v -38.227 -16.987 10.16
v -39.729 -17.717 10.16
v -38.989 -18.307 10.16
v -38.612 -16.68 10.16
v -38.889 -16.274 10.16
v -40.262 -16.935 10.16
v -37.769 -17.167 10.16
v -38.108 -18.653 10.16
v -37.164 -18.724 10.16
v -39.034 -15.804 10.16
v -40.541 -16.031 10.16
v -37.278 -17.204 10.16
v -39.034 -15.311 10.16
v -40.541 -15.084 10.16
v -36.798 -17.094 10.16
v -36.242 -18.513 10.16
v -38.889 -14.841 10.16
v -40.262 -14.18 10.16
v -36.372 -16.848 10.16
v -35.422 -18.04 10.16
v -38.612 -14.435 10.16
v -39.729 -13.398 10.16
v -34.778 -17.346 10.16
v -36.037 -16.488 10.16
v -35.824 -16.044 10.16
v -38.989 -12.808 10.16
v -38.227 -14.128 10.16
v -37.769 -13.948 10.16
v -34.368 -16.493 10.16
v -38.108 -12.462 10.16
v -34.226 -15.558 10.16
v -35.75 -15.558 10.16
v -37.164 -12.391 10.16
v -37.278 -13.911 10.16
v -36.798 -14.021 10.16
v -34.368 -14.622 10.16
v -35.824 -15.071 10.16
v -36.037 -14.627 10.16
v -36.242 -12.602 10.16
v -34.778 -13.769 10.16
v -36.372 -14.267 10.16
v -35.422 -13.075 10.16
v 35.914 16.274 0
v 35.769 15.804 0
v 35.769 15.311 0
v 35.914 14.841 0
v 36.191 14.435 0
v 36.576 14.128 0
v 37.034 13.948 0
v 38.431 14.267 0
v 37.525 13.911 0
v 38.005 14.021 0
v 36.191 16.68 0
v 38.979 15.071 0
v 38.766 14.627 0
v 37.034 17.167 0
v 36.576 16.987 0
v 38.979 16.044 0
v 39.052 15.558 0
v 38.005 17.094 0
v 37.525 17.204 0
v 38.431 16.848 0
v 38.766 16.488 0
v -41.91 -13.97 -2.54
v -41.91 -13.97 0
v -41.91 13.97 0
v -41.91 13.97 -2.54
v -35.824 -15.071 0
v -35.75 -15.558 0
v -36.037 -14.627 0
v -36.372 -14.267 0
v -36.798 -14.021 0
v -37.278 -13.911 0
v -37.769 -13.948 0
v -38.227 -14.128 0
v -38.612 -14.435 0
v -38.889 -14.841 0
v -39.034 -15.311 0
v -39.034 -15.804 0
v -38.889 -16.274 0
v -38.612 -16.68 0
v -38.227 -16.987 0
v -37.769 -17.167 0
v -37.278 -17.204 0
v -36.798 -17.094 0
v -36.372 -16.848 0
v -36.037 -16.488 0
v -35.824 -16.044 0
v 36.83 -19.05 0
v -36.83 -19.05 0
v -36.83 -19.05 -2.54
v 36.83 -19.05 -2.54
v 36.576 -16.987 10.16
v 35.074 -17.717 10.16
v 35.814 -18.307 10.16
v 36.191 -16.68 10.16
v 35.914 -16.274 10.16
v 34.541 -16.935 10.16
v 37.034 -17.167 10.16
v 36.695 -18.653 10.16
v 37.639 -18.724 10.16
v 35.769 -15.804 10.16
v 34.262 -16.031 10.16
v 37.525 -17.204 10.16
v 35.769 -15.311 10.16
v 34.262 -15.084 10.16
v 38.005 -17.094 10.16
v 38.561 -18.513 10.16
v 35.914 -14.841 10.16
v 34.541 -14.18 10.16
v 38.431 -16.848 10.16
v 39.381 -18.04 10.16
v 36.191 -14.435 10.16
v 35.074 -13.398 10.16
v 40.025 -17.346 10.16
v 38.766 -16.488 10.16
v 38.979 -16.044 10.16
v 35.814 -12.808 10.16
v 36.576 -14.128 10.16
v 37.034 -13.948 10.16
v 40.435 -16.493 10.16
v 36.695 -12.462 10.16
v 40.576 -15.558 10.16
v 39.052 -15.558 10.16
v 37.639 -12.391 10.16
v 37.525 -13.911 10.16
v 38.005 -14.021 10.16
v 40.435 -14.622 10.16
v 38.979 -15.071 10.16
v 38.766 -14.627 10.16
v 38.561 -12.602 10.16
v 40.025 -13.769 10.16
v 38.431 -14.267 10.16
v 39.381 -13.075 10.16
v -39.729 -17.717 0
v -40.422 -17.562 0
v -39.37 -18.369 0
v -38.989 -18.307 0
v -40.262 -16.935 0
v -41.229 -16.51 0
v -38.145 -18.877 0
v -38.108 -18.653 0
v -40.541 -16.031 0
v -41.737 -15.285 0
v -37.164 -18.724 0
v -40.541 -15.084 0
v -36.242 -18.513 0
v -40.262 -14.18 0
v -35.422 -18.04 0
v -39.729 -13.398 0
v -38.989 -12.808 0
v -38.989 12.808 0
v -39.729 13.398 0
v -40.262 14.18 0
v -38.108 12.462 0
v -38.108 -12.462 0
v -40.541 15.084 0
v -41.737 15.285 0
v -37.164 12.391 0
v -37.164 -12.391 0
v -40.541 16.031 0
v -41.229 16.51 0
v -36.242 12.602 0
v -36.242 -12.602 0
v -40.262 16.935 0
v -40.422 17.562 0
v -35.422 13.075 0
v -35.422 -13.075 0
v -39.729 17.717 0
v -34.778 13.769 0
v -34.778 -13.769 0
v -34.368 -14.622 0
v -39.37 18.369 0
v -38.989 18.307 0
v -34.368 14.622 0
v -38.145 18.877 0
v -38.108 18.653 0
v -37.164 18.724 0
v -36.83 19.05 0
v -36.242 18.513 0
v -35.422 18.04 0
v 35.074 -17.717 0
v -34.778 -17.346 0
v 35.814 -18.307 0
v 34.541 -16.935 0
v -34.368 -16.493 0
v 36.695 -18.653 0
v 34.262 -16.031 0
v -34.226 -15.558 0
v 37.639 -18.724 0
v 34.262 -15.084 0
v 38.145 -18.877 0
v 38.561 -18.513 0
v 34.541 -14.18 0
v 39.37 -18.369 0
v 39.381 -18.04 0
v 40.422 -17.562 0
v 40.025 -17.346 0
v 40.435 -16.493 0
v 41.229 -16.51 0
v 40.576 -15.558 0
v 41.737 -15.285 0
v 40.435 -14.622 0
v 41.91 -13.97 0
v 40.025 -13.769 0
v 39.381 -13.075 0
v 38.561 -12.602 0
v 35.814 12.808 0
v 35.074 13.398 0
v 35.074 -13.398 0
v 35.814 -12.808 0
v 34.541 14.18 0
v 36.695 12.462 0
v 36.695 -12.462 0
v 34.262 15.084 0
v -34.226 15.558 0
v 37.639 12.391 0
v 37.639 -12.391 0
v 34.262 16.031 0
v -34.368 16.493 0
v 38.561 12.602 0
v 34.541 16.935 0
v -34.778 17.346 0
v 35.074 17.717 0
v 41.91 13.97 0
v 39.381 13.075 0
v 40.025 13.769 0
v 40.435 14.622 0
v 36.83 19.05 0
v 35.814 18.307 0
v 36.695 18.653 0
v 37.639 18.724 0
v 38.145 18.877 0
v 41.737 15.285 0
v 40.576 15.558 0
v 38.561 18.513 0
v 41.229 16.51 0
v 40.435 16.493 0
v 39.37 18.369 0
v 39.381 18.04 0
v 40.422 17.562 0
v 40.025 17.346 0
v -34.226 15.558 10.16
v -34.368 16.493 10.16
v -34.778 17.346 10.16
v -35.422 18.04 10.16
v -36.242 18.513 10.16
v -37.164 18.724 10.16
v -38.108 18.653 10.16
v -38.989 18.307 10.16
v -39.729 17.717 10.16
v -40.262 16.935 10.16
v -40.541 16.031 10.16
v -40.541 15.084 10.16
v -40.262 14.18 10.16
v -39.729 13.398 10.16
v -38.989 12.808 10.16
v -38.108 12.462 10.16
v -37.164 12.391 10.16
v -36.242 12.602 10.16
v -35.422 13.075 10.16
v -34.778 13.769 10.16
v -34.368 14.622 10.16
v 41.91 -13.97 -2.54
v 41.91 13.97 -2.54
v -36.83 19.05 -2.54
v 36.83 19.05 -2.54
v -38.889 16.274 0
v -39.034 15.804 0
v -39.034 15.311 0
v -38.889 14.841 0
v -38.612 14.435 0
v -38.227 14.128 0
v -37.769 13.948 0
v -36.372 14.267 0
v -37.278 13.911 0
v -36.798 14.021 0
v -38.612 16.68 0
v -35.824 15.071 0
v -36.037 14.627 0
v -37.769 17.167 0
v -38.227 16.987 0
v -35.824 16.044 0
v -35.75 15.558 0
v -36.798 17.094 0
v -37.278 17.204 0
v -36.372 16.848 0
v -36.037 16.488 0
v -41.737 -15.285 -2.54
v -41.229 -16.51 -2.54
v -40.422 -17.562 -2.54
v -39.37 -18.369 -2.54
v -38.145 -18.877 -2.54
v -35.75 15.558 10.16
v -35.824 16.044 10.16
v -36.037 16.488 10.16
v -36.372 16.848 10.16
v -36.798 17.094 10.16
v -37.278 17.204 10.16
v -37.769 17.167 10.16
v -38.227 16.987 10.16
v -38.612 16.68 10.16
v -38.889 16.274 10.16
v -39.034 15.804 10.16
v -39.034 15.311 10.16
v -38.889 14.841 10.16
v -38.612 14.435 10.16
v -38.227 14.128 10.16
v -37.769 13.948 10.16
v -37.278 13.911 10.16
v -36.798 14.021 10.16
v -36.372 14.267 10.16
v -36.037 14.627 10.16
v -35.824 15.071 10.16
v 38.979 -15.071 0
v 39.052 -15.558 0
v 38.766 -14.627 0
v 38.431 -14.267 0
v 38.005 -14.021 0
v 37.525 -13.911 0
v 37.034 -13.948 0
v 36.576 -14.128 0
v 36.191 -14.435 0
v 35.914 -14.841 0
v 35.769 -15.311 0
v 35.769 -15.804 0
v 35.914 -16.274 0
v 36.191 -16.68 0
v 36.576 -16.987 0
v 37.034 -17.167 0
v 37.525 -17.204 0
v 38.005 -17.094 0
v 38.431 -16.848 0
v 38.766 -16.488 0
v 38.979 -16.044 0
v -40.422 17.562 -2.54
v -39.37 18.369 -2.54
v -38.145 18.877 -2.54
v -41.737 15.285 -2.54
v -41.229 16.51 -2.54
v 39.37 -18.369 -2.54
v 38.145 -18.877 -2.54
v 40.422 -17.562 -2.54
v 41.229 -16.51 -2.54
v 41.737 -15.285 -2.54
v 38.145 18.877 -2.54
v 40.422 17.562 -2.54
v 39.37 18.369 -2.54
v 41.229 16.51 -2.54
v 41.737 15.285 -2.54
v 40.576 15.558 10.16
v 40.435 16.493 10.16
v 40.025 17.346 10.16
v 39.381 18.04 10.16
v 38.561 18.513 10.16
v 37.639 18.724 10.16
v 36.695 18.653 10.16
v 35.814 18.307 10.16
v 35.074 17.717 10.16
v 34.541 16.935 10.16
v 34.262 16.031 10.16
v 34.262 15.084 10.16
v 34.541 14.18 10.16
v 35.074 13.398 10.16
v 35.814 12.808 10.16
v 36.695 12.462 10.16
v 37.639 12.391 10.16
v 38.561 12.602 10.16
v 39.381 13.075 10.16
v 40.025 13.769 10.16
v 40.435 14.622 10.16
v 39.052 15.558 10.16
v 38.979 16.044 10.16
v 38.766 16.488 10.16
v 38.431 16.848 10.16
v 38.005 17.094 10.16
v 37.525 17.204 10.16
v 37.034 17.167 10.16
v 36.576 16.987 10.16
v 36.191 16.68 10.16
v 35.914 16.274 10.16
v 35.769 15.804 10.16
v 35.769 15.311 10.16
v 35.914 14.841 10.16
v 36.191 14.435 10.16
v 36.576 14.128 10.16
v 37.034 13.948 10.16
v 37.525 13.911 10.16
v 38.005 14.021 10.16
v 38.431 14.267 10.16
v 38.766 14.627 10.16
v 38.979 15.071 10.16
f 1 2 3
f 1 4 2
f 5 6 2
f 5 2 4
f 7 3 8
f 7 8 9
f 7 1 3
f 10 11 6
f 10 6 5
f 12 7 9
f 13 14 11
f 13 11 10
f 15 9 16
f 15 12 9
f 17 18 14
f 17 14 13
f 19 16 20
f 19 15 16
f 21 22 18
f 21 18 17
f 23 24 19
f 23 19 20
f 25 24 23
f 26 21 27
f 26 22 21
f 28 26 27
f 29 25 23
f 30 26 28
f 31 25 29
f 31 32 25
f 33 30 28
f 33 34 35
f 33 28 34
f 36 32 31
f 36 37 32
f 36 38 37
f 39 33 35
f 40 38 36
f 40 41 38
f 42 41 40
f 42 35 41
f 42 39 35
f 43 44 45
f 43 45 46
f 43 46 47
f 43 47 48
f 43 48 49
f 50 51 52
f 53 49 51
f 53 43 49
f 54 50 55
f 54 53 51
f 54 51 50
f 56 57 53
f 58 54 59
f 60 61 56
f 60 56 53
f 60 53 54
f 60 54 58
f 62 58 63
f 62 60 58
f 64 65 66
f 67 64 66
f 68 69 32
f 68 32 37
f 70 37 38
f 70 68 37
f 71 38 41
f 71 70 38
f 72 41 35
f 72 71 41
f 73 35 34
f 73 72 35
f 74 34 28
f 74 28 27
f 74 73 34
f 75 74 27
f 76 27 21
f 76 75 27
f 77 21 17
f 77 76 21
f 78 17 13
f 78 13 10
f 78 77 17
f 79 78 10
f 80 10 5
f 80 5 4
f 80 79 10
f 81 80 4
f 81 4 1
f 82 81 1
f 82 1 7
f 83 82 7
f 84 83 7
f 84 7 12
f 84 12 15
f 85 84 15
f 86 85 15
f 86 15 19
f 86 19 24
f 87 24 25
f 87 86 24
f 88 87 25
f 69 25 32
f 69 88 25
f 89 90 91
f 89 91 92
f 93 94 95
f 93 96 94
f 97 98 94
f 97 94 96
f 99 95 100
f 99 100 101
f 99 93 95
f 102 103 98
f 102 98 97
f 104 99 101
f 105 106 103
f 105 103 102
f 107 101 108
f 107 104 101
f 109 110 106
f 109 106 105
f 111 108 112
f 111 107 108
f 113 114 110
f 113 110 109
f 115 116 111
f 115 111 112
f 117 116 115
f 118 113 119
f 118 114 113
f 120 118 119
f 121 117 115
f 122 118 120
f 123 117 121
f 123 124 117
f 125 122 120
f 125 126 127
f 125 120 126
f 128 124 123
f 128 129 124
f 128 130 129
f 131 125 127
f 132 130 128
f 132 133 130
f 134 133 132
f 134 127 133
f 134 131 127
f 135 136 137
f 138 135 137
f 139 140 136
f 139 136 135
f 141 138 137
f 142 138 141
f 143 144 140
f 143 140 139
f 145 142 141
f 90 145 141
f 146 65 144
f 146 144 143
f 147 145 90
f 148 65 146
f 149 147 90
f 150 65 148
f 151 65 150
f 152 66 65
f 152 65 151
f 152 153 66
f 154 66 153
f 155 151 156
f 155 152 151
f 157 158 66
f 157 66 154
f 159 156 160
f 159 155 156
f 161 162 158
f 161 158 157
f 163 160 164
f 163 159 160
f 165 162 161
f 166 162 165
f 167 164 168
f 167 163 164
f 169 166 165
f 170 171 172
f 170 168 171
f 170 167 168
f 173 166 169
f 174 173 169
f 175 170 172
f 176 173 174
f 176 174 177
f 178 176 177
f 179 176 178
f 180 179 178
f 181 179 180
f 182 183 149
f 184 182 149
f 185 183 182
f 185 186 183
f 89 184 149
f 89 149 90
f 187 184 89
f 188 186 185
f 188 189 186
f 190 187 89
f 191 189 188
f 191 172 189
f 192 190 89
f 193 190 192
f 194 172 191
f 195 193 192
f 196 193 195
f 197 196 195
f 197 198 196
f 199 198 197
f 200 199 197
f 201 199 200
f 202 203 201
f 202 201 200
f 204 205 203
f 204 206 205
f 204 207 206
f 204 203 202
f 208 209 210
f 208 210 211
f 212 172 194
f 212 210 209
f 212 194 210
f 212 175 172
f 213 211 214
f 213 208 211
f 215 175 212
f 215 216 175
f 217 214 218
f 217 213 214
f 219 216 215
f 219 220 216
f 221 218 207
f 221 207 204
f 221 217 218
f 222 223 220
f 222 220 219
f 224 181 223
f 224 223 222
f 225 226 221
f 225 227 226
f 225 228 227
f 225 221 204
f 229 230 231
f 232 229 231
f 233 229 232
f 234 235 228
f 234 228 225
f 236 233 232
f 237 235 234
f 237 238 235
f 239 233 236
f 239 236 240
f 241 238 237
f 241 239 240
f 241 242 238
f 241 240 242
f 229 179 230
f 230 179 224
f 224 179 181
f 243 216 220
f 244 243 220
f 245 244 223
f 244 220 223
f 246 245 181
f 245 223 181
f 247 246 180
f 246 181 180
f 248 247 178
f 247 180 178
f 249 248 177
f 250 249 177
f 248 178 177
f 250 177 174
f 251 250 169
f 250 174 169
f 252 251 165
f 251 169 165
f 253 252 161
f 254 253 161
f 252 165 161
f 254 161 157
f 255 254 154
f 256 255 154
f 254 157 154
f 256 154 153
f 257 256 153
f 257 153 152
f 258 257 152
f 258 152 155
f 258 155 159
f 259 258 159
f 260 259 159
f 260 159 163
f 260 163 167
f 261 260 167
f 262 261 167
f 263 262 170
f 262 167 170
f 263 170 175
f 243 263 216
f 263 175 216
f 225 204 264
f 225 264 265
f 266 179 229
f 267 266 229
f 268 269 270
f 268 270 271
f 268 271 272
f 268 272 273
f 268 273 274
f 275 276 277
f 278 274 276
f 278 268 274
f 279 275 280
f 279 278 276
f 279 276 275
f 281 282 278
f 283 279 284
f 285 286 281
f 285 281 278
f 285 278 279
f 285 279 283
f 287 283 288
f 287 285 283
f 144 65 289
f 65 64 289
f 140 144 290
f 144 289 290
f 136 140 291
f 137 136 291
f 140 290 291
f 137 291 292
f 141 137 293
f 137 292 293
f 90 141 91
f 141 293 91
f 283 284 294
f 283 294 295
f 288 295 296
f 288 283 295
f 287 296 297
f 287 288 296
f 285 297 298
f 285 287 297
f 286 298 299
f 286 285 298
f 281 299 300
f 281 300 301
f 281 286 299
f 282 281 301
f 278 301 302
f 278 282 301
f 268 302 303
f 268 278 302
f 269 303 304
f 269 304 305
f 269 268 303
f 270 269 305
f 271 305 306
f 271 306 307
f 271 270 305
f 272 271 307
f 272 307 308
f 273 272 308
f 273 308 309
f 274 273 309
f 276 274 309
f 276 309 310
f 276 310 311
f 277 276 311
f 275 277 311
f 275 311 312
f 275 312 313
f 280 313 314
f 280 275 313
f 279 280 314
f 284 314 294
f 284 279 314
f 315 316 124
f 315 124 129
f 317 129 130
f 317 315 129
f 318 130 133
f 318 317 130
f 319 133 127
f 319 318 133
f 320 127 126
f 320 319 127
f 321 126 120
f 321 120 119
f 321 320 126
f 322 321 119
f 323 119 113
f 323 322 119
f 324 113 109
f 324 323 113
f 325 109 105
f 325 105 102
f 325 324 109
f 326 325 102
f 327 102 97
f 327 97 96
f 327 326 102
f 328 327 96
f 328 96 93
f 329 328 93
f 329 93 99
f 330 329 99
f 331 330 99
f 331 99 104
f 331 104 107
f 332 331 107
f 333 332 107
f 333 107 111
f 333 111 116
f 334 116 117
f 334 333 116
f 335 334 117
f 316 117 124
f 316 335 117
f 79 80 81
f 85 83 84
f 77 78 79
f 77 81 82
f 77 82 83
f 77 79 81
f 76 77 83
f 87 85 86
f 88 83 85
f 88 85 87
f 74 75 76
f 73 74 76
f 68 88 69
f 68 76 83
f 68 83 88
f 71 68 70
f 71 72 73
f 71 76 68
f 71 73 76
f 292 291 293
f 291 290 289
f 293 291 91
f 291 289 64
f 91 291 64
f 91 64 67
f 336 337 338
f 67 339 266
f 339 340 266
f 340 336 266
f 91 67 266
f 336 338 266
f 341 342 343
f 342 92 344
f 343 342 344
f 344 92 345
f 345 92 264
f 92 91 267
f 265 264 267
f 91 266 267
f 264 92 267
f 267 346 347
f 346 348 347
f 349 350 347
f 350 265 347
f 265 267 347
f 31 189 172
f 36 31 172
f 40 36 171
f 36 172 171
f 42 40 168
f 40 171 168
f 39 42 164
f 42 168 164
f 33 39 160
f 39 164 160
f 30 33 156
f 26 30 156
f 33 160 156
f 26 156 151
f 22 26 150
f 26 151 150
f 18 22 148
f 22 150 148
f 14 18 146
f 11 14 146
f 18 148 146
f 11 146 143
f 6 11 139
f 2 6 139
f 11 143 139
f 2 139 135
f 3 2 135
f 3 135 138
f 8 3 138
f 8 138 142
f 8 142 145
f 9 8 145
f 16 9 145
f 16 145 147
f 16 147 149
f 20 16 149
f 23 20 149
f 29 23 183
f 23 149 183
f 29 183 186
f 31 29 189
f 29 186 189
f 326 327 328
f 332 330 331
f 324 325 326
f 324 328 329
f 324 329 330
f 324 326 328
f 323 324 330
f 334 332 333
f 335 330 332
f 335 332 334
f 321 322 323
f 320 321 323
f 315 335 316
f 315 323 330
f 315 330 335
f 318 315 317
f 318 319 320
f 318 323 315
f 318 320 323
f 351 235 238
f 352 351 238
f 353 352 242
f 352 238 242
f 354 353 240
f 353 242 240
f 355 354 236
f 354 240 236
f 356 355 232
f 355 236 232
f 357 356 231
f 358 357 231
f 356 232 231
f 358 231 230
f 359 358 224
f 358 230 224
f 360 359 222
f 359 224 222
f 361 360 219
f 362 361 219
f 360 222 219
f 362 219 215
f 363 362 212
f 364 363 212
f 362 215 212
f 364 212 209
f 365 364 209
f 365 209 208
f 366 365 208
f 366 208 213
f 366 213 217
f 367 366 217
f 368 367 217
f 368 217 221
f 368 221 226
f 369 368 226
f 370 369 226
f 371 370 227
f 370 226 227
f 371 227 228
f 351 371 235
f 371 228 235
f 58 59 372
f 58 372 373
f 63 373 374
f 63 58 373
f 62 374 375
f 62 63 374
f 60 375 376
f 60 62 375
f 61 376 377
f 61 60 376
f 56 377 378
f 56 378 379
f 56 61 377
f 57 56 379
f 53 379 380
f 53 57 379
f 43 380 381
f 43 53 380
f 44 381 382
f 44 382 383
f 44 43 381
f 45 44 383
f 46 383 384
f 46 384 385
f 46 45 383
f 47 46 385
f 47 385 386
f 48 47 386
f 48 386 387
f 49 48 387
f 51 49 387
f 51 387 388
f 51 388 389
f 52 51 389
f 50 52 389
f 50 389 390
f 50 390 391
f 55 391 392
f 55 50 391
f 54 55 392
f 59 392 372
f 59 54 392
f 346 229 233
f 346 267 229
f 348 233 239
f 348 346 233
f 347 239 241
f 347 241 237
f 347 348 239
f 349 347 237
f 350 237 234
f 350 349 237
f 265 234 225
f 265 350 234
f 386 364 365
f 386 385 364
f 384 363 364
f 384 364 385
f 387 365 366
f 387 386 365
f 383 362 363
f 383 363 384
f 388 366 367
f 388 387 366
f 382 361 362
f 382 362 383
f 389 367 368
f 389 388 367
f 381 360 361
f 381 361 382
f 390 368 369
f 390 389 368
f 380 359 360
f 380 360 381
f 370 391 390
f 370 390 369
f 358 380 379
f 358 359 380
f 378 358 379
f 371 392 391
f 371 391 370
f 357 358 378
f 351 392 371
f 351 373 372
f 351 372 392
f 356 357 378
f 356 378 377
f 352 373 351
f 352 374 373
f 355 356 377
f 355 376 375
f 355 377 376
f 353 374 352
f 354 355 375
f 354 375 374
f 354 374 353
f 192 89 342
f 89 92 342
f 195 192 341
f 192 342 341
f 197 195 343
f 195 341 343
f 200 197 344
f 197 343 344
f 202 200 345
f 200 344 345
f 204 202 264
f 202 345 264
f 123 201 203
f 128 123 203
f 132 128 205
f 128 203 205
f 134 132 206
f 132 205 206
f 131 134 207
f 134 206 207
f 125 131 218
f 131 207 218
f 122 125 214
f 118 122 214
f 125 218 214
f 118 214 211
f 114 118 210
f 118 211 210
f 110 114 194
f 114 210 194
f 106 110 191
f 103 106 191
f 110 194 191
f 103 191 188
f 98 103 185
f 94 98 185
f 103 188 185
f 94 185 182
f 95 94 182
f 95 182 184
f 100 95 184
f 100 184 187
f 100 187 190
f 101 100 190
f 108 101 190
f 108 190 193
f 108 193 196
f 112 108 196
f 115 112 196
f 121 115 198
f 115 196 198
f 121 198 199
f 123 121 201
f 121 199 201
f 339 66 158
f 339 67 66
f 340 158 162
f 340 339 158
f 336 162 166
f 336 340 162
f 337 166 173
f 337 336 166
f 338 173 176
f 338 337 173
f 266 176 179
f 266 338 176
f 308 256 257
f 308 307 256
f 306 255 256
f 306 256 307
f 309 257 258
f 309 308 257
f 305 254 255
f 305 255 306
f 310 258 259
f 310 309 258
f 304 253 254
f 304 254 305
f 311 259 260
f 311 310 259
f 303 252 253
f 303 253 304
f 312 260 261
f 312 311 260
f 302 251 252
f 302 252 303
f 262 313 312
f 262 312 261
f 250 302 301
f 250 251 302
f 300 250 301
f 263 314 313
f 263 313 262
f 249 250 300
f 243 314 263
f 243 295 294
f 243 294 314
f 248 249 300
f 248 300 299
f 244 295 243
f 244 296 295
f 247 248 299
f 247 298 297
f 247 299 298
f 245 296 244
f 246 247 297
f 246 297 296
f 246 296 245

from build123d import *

# Parameters (mm, degrees)
F1_W     = 83.82
F1_H     = 38.1
F1_R     = 3.175
F1_R_2   = 1.651
F2_DEPTH = 2.54
F3_DEPTH = 10.16
F4_R     = 5.08


with BuildPart() as f2:
    # F1 (on Top) → F2 (new body)
    with BuildSketch(Plane.XY):
        Rectangle(F1_W, F1_H)
        with Locations((-37.4015, -15.5575)):
            Circle(F1_R, mode=Mode.SUBTRACT)
        with Locations((37.4015, -15.5575)):
            Circle(F1_R, mode=Mode.SUBTRACT)
        with Locations((-37.4015, 15.5575)):
            Circle(F1_R, mode=Mode.SUBTRACT)
        with Locations((37.4015, 15.5575)):
            Circle(F1_R, mode=Mode.SUBTRACT)
        with Locations((-37.4015, 15.5575)):
            Circle(F1_R)
        with Locations((-37.4015, 15.5575)):
            Circle(F1_R_2, mode=Mode.SUBTRACT)
        with Locations((37.4015, -15.5575)):
            Circle(F1_R)
        with Locations((37.4015, -15.5575)):
            Circle(F1_R_2, mode=Mode.SUBTRACT)
        with Locations((37.4015, 15.5575)):
            Circle(F1_R)
        with Locations((37.4015, 15.5575)):
            Circle(F1_R_2, mode=Mode.SUBTRACT)
        with Locations((-37.4015, -15.5575)):
            Circle(F1_R)
        with Locations((-37.4015, -15.5575)):
            Circle(F1_R_2, mode=Mode.SUBTRACT)
        with Locations((37.4015, 15.5575)):
            Circle(F1_R_2)
        with Locations((-37.4015, 15.5575)):
            Circle(F1_R_2)
        with Locations((-37.4015, -15.5575)):
            Circle(F1_R_2)
        with Locations((37.4015, -15.5575)):
            Circle(F1_R_2)
    extrude(amount=-F2_DEPTH)

    # F1 (on Top) → F3 (join)
    with BuildSketch(Plane.XY):
        with Locations((-37.4015, -15.5575)):
            Circle(F1_R)
        with Locations((-37.4015, -15.5575)):
            Circle(F1_R_2, mode=Mode.SUBTRACT)
        with Locations((-37.4015, 15.5575)):
            Circle(F1_R)
        with Locations((-37.4015, 15.5575)):
            Circle(F1_R_2, mode=Mode.SUBTRACT)
        with Locations((37.4015, -15.5575)):
            Circle(F1_R)
        with Locations((37.4015, -15.5575)):
            Circle(F1_R_2, mode=Mode.SUBTRACT)
        with Locations((37.4015, 15.5575)):
            Circle(F1_R)
        with Locations((37.4015, 15.5575)):
            Circle(F1_R_2, mode=Mode.SUBTRACT)
    extrude(amount=F3_DEPTH)

    # F4
    f4_edges = [f2.edges().sort_by_distance(p)[0] for p in [
        (-41.91, -19.05, -1.27),
        (41.91, -19.05, -1.27),
        (41.91, 19.05, -1.27),
        (-41.91, 19.05, -1.27),
    ]]
    fillet(f4_edges, radius=F4_R)


solid = f2.part
